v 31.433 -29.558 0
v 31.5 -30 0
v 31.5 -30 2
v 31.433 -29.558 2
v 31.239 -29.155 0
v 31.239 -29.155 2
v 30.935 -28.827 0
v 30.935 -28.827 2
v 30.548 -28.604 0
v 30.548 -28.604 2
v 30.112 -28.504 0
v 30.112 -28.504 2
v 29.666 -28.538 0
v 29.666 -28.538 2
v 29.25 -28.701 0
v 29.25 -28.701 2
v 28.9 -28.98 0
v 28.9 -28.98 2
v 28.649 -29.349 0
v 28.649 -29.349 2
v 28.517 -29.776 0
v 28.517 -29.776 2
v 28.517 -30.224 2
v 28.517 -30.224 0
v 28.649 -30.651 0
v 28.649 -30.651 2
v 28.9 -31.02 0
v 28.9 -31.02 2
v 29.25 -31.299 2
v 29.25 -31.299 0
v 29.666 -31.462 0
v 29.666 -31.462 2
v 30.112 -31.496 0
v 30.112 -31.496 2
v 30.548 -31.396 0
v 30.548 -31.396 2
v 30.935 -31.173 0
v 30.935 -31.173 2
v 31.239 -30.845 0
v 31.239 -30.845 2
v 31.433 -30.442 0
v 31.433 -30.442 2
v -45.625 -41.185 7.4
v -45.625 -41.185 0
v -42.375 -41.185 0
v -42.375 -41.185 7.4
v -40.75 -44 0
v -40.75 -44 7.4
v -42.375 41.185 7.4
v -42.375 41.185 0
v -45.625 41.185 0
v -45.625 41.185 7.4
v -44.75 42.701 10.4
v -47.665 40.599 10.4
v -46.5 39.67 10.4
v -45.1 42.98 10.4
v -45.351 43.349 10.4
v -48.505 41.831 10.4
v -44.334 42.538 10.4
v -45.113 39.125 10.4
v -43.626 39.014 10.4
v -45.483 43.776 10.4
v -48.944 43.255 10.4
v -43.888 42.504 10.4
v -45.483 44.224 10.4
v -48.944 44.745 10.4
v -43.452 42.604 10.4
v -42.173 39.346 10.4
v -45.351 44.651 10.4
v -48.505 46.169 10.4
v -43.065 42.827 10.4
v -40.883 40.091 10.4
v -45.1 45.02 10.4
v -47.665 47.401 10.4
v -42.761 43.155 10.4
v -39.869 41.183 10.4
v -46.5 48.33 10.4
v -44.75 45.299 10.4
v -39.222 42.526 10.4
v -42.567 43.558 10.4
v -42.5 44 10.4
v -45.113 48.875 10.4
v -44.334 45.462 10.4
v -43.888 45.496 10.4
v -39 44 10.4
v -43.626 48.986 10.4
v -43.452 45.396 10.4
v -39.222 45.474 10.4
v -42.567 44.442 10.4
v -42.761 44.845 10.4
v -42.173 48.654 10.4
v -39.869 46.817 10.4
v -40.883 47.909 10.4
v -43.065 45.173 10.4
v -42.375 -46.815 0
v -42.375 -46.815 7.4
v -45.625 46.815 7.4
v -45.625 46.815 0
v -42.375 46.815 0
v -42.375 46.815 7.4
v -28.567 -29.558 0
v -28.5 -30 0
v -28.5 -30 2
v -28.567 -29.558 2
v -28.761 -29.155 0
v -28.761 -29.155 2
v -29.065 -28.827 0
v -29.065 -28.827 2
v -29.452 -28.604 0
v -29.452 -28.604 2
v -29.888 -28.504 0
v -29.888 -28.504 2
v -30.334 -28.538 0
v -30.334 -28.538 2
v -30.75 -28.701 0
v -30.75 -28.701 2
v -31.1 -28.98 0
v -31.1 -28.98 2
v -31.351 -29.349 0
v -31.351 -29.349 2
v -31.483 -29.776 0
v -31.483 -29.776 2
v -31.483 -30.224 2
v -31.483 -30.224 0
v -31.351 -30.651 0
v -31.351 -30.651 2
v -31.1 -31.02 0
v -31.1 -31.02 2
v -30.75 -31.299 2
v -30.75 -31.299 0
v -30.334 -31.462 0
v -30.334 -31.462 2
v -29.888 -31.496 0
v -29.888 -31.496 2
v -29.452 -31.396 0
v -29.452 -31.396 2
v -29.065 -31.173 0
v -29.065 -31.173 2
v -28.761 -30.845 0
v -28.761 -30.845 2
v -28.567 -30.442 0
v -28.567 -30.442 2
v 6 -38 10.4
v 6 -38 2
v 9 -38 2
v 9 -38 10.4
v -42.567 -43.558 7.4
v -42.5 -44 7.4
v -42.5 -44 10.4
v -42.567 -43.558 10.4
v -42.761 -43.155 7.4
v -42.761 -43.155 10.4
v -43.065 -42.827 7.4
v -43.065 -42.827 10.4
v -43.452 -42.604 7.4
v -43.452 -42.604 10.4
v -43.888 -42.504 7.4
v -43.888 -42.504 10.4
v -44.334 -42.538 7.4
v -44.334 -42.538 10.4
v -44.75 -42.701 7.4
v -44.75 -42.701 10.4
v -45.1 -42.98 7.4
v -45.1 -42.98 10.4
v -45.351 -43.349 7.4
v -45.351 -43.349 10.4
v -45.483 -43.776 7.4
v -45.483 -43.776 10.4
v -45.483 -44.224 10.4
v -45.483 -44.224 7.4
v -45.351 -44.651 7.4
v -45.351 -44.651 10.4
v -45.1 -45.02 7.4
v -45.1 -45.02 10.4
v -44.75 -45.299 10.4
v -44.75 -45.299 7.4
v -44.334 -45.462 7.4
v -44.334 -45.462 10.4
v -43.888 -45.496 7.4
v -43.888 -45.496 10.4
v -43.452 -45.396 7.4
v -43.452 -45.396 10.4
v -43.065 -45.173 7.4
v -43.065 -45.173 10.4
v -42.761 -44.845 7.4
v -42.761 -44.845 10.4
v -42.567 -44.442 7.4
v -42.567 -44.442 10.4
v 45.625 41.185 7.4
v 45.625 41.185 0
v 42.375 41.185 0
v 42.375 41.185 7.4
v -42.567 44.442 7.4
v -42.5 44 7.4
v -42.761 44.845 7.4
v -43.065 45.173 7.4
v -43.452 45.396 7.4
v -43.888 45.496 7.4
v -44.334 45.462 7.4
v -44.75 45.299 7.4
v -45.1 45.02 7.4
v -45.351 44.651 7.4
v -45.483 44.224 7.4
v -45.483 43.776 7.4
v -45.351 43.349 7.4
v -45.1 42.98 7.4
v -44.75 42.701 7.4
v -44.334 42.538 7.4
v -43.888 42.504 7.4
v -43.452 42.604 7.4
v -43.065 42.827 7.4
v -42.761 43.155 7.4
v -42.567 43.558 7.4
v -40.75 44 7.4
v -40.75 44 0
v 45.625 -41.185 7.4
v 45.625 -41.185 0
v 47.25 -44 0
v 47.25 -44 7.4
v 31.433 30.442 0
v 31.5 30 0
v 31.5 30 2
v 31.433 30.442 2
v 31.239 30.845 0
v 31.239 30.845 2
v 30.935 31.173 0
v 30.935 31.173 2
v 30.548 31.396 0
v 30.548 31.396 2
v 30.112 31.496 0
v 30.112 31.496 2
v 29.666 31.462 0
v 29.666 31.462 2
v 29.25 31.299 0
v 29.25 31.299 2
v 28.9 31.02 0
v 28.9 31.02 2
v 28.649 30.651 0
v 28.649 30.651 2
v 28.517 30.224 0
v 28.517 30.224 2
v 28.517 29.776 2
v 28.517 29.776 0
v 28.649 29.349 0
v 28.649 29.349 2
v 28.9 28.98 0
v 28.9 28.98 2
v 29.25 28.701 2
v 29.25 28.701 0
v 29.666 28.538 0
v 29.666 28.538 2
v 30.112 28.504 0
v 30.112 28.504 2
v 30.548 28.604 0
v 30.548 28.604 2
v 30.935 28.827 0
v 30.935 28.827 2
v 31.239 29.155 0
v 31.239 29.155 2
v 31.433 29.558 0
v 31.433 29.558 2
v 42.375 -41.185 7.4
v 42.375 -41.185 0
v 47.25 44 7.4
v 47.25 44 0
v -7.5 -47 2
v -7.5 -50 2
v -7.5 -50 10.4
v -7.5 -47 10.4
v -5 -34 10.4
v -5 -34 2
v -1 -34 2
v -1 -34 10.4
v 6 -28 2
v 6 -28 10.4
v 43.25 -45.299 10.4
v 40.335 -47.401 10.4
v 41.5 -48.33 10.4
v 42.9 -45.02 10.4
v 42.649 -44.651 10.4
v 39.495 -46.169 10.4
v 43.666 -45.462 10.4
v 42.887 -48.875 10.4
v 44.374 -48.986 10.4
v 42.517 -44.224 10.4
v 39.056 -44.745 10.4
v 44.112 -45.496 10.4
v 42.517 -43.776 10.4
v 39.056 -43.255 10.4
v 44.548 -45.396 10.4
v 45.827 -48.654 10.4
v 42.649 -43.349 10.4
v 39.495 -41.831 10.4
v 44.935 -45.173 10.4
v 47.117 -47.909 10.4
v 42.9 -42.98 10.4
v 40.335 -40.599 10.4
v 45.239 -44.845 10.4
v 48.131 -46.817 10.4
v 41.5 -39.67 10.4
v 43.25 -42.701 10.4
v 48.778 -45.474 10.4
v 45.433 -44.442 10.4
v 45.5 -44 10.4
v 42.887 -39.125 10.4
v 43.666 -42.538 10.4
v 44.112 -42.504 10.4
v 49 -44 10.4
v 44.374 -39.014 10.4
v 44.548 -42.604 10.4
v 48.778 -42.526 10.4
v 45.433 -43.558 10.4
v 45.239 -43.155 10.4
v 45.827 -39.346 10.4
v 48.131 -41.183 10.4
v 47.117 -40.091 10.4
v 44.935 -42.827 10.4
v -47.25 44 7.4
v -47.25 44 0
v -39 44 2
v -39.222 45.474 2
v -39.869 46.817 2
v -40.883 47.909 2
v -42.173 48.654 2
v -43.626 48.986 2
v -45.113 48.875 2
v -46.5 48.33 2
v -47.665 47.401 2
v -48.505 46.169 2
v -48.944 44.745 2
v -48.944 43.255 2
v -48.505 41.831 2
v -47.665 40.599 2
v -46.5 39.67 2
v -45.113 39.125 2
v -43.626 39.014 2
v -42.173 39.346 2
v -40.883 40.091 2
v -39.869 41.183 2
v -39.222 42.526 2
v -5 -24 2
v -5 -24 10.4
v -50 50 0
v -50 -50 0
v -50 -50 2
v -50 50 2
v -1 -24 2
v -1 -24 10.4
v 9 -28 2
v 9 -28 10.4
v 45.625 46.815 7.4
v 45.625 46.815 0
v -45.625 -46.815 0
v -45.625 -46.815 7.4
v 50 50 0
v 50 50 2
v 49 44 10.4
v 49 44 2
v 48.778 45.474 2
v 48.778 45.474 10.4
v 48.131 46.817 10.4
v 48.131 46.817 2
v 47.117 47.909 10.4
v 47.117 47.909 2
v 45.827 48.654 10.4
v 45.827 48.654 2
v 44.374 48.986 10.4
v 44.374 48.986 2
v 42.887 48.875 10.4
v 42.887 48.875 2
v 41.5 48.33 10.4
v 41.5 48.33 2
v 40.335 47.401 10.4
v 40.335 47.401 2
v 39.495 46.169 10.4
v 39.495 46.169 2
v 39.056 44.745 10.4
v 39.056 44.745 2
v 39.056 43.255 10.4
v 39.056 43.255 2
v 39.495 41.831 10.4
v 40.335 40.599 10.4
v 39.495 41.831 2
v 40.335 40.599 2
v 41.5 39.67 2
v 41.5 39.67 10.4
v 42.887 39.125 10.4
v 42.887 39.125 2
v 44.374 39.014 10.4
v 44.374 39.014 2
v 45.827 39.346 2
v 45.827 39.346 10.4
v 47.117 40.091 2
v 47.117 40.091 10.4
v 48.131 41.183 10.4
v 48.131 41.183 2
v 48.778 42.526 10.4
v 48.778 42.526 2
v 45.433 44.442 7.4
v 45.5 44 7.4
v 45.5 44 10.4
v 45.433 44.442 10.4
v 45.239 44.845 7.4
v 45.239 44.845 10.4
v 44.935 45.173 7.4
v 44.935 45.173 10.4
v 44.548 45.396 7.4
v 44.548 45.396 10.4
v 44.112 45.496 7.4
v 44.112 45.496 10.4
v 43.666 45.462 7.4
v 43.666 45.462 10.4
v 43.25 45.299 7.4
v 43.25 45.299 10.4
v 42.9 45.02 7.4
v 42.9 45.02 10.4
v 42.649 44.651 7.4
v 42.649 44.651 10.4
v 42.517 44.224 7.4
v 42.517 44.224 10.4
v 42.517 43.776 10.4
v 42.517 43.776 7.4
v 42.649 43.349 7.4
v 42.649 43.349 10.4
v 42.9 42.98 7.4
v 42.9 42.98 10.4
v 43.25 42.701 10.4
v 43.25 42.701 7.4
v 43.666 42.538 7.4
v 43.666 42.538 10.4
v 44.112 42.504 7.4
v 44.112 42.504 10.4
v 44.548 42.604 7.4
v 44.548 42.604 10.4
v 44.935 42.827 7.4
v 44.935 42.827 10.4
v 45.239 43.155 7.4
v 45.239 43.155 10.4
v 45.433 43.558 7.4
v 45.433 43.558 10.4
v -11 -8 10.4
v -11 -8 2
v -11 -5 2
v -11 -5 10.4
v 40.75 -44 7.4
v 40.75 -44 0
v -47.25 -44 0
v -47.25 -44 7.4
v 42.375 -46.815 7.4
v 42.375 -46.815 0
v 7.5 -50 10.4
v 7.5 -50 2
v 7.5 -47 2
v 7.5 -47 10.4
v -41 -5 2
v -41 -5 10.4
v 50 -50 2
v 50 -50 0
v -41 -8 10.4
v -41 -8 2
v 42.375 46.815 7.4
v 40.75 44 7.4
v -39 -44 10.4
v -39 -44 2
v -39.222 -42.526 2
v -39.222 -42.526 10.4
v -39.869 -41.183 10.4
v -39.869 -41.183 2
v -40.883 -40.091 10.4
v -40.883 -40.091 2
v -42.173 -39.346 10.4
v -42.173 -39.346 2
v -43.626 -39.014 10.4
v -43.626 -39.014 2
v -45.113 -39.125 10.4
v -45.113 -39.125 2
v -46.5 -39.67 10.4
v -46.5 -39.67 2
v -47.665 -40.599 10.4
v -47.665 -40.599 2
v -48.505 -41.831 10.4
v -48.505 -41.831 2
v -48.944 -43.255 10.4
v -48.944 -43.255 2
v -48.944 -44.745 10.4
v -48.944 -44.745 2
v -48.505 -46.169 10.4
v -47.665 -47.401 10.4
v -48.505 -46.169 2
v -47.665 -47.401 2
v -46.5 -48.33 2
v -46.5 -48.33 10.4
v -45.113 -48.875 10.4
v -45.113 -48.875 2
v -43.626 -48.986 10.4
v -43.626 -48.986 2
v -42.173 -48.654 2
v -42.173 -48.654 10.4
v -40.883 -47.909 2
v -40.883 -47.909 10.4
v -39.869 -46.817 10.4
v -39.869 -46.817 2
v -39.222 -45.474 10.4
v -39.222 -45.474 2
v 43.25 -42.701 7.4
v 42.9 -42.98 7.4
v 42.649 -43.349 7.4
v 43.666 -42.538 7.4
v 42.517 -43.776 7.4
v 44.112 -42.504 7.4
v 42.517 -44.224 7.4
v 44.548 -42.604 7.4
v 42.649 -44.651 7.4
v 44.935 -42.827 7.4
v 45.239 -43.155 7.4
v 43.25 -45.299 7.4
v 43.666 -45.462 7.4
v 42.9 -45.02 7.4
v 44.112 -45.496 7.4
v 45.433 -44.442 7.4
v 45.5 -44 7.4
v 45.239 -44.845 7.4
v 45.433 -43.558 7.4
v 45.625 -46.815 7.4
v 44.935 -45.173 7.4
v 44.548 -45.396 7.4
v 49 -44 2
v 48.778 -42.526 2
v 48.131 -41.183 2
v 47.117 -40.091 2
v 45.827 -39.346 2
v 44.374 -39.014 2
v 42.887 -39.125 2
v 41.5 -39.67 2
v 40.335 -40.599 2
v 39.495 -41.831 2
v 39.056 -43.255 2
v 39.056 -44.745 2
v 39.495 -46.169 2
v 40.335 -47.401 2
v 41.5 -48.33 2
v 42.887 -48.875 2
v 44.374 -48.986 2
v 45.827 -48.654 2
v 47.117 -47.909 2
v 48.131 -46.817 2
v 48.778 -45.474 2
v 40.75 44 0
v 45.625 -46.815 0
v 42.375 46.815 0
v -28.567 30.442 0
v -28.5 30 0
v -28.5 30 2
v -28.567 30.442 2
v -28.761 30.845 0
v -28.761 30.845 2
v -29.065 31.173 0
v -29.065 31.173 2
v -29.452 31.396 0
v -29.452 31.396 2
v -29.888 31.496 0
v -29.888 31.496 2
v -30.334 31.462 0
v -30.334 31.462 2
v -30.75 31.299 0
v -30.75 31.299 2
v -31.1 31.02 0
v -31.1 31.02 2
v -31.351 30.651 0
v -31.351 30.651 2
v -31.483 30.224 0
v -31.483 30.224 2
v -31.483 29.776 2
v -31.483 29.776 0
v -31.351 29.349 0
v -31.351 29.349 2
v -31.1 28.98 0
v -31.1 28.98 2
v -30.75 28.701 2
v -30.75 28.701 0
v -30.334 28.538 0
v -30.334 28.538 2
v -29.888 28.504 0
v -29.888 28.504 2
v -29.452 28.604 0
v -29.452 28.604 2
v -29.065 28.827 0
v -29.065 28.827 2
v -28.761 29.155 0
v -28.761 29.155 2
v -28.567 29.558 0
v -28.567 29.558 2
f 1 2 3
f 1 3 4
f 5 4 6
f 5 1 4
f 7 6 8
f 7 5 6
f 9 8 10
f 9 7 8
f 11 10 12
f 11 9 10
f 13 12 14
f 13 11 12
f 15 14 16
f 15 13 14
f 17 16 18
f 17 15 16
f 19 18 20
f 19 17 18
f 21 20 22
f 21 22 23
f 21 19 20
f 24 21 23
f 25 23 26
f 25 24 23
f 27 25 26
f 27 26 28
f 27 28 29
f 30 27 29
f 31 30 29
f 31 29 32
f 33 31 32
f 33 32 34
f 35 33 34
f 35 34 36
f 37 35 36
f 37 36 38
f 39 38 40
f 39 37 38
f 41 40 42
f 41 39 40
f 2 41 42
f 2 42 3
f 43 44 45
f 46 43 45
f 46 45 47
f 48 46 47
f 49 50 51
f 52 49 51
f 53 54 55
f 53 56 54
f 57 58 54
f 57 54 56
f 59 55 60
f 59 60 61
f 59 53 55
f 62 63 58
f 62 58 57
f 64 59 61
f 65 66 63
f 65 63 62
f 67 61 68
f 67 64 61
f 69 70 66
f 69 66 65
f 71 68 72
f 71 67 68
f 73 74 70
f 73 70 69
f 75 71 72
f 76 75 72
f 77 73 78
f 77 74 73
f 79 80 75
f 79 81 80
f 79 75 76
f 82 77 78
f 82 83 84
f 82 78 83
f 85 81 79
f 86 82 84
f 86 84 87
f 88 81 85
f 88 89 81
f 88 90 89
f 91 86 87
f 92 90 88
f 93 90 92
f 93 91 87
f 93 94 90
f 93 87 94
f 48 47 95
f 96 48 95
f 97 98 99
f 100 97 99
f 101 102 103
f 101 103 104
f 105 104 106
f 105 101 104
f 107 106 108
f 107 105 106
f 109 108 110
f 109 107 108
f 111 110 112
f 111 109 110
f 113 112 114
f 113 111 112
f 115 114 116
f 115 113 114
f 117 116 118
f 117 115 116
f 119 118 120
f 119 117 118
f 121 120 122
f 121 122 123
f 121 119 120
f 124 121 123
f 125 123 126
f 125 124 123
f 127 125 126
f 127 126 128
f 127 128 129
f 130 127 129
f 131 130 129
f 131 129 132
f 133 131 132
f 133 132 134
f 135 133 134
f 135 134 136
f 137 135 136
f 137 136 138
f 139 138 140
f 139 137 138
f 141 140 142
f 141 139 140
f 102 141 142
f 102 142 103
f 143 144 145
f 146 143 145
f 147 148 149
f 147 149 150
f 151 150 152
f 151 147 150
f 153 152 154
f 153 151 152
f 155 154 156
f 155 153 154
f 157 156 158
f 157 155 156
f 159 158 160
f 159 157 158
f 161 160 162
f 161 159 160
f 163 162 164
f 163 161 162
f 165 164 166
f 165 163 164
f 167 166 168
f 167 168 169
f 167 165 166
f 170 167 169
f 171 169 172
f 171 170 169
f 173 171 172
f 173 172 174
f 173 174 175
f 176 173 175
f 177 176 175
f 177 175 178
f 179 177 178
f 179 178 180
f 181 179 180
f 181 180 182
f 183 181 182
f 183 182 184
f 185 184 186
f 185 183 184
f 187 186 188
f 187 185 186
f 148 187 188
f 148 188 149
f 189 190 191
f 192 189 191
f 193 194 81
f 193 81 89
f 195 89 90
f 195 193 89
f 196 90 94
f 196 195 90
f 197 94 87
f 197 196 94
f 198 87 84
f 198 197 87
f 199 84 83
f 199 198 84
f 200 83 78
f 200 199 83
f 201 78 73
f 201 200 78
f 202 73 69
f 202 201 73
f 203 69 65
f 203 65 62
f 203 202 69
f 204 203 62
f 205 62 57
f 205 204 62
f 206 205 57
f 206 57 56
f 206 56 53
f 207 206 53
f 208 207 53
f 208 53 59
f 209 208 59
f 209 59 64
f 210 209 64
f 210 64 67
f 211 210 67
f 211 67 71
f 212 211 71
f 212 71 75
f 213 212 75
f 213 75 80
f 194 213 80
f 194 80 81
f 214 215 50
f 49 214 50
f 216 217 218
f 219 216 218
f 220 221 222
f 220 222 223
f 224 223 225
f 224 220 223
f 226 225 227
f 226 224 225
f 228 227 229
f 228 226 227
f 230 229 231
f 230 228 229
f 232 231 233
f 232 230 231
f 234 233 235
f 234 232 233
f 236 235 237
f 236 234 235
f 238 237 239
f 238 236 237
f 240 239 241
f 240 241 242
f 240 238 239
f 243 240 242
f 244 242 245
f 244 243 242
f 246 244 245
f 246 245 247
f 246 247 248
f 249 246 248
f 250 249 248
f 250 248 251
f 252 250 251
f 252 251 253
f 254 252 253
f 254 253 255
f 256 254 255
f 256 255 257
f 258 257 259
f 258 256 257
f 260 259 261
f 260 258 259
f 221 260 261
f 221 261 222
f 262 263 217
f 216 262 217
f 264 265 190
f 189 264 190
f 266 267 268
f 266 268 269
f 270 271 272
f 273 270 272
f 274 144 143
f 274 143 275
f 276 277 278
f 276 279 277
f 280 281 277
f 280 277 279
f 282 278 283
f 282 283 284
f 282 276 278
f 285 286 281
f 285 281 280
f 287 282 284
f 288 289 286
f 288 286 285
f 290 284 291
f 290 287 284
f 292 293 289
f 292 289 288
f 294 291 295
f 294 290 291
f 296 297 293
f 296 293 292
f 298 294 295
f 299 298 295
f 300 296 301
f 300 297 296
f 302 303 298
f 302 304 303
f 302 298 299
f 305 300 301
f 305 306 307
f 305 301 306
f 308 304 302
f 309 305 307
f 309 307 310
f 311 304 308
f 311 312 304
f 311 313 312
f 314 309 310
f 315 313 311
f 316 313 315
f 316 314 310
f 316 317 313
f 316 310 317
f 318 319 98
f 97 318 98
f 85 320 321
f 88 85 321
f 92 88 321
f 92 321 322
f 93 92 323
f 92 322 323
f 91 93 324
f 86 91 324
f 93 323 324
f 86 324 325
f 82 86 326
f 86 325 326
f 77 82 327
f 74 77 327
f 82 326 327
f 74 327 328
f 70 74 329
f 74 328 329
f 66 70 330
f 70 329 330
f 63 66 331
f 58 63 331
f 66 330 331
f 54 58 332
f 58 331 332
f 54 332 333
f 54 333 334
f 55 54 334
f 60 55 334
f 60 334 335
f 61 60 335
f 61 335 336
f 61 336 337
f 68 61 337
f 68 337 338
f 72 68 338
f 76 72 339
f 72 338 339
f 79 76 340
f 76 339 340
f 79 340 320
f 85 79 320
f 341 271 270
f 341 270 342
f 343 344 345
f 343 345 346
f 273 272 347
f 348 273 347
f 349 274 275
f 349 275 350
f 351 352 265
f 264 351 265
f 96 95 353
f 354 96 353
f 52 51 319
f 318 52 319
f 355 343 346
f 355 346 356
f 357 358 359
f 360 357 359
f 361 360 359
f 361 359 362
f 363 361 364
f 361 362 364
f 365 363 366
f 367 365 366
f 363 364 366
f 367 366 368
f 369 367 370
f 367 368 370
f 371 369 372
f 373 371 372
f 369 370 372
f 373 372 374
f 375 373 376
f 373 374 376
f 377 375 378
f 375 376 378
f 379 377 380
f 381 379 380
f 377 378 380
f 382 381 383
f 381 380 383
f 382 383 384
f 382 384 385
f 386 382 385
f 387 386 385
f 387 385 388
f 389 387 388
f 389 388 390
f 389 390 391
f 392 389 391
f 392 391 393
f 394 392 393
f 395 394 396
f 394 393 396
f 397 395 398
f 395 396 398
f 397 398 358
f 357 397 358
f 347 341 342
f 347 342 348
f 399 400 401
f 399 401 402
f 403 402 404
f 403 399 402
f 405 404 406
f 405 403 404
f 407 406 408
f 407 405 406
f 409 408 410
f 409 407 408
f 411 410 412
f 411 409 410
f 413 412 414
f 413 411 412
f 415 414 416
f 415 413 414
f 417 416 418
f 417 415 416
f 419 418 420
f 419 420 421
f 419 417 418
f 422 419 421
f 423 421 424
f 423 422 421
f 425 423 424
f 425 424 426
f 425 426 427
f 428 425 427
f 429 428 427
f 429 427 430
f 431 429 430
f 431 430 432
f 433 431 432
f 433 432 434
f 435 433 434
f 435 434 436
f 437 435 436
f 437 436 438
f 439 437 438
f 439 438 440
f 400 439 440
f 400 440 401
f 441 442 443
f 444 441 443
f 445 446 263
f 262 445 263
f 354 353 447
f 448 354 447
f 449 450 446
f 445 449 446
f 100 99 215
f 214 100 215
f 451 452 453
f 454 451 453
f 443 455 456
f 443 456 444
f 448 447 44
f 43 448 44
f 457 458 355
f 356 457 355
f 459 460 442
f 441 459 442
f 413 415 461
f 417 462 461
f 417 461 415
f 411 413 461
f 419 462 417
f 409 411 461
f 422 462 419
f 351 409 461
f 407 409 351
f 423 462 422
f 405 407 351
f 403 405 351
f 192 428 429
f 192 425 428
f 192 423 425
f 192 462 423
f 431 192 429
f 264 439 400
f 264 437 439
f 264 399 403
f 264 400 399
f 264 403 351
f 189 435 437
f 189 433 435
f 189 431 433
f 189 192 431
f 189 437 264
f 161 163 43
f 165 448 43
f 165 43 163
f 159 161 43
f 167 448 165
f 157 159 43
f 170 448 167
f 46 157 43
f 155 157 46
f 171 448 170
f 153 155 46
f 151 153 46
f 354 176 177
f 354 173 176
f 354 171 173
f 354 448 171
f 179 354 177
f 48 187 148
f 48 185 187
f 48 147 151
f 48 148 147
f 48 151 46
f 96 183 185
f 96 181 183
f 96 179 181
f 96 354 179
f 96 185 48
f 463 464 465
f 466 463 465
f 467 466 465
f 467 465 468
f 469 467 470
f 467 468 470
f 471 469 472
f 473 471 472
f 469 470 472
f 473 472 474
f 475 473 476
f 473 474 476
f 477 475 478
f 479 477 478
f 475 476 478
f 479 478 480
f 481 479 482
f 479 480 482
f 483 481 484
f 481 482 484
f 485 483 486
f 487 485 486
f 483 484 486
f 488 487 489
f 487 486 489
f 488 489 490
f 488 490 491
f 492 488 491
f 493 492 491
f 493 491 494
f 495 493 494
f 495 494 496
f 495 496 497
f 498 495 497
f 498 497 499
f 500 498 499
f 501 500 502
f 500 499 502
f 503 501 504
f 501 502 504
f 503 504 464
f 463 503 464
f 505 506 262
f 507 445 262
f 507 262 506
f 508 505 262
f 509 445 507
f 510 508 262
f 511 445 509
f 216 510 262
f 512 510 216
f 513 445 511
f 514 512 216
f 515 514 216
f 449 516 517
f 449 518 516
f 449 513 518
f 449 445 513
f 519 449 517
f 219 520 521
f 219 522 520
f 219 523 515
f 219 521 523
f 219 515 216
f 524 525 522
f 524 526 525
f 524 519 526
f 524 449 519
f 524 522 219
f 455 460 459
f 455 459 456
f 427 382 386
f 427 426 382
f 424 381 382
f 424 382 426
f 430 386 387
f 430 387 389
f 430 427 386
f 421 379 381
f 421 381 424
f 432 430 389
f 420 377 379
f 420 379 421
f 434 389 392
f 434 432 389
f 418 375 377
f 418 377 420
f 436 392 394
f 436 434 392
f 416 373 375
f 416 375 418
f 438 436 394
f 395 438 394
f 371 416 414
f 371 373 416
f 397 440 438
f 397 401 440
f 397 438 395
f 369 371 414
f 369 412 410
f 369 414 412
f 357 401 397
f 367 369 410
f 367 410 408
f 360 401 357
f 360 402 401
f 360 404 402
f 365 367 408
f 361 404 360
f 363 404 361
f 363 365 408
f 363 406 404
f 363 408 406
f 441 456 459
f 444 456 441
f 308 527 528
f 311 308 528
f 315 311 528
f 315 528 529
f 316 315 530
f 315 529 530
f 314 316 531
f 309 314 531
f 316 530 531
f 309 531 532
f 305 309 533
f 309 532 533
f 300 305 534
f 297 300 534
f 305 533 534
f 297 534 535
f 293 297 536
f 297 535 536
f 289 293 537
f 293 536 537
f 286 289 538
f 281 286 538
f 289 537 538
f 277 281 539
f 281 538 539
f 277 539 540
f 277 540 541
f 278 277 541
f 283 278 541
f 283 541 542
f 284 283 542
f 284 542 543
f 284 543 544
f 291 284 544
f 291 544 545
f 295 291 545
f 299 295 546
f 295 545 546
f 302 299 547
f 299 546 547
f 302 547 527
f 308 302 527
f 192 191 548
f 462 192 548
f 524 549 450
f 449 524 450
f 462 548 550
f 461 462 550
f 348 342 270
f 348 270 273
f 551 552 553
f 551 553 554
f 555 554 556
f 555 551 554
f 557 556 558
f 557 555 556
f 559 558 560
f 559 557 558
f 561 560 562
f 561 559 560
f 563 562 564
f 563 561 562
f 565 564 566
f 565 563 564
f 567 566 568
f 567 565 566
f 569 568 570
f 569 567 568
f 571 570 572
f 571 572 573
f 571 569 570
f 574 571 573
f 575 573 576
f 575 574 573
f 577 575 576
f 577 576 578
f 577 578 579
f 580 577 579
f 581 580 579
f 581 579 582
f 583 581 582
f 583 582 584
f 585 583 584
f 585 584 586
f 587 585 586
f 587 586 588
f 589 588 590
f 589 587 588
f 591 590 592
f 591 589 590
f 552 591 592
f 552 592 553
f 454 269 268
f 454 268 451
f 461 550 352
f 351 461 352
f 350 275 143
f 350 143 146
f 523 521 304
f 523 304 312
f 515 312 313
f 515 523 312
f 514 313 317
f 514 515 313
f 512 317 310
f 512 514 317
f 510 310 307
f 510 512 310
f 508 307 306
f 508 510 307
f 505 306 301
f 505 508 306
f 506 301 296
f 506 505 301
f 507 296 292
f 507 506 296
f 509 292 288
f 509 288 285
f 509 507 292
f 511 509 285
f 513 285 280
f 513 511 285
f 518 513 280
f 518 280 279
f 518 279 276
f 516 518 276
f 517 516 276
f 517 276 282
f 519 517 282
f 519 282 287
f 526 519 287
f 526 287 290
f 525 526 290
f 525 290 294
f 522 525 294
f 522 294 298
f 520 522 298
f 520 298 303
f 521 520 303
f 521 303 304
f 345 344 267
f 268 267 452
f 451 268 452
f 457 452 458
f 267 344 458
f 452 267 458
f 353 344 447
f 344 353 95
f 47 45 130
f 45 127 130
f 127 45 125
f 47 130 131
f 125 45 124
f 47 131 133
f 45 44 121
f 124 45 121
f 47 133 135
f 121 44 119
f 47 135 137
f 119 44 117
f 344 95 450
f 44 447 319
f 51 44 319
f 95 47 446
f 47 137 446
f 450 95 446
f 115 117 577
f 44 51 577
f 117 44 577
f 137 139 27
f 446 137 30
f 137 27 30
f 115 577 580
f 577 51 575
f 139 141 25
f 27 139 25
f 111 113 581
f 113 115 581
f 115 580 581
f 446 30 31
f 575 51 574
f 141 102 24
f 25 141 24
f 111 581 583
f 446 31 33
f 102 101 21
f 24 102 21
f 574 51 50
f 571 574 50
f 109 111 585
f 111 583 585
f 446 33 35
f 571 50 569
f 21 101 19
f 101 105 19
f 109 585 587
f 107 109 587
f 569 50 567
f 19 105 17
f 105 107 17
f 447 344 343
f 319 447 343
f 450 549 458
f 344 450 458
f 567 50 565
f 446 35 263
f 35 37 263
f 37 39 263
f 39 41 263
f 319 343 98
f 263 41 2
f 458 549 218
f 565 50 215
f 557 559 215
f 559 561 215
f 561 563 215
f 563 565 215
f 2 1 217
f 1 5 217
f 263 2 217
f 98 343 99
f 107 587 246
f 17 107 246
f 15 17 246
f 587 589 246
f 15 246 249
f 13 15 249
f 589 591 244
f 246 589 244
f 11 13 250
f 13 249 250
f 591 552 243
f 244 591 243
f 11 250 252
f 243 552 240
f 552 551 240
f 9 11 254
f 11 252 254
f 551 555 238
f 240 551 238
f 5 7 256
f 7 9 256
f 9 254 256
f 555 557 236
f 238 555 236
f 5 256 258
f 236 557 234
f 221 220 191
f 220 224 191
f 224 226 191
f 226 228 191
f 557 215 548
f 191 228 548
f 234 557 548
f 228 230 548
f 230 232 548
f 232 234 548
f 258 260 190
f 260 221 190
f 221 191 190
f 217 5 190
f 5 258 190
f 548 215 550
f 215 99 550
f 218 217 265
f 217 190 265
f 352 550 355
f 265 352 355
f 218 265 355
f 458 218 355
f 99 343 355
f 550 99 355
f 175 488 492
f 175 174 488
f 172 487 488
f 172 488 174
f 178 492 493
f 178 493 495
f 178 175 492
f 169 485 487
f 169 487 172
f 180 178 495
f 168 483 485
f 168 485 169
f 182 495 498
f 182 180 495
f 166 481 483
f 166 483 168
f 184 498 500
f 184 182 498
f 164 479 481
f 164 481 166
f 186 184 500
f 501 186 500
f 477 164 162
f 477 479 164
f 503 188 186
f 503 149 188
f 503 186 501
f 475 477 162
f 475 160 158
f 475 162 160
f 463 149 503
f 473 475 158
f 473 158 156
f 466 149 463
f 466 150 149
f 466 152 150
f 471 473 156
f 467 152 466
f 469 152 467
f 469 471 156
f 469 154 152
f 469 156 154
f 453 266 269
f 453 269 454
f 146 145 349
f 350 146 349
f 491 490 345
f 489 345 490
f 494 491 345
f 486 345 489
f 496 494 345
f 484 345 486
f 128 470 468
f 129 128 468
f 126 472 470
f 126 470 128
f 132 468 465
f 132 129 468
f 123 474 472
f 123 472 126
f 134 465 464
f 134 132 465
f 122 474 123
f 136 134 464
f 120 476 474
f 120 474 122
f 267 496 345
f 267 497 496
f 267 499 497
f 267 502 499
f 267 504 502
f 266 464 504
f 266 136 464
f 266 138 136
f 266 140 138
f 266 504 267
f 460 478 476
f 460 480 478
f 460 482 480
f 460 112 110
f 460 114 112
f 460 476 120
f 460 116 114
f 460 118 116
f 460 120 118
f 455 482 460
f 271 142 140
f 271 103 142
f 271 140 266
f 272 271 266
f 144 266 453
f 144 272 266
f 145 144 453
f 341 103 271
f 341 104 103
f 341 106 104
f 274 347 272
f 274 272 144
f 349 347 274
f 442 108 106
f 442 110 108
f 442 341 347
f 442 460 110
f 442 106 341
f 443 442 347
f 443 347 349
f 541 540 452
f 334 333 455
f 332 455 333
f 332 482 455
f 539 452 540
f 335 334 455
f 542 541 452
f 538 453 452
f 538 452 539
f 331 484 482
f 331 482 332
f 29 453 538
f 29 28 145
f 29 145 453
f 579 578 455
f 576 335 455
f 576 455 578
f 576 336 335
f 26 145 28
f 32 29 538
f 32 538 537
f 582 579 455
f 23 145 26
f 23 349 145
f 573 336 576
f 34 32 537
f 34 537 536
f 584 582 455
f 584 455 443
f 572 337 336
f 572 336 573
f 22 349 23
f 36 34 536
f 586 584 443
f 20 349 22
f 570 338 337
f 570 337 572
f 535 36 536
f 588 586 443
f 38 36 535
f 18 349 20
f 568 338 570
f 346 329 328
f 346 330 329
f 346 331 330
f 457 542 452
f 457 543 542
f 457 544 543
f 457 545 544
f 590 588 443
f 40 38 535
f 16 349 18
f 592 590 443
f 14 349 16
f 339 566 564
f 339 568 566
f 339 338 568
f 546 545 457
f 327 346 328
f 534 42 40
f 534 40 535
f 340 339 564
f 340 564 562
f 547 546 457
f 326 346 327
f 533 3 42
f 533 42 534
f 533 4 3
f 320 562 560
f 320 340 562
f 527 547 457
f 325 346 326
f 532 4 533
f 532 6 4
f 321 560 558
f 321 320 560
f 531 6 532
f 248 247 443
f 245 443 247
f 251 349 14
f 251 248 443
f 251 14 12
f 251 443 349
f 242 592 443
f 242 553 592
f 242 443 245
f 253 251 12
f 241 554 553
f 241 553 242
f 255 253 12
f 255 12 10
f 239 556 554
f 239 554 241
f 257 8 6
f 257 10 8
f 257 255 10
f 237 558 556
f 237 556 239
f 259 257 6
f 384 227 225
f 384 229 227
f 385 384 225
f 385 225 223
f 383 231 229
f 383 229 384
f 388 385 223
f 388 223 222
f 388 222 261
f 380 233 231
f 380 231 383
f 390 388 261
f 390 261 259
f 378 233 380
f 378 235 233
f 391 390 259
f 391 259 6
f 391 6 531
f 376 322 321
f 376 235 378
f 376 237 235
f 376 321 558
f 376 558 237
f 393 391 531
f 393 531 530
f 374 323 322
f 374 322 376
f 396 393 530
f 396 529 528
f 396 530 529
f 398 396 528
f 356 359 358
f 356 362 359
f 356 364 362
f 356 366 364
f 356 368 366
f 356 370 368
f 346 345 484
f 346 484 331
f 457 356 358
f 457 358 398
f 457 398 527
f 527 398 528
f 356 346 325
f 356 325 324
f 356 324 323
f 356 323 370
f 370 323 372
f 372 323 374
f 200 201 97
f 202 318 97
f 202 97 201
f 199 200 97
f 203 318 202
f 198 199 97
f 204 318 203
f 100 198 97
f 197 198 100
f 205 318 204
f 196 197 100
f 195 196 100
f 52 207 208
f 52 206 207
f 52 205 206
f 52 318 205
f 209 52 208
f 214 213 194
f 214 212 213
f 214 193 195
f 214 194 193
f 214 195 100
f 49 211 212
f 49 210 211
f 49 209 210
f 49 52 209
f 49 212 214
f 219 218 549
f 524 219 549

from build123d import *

# Parameters (mm, degrees)
SKETCH_W      = 100
SKETCH_H      = 100
SKETCH_R      = 1.5
PAD_DEPTH     = 2
SKETCH005_R   = 5
SKETCH005_R_2 = 1.5
PAD001_DEPTH  = 8.4
SKETCH007_W   = 4
SKETCH007_H   = 10
SKETCH007_W_2 = 3
SKETCH007_W_3 = 15
SKETCH007_H_2 = 3
SKETCH007_W_4 = 30
PAD002_DEPTH  = 8.4
POCKET_DEPTH  = 7.4


with BuildPart() as part:
    # Sketch → Pad (new body)
    with BuildSketch(Plane.XY):
        Rectangle(SKETCH_W, SKETCH_H)
        with Locations((-30, -30)):
            Circle(SKETCH_R, mode=Mode.SUBTRACT)
        with Locations((30, -30)):
            Circle(SKETCH_R, mode=Mode.SUBTRACT)
        with Locations((30, 30)):
            Circle(SKETCH_R, mode=Mode.SUBTRACT)
        with Locations((-30, 30)):
            Circle(SKETCH_R, mode=Mode.SUBTRACT)
        with Locations((-44, 44)):
            Circle(SKETCH_R, mode=Mode.SUBTRACT)
        with Locations((44, 44)):
            Circle(SKETCH_R, mode=Mode.SUBTRACT)
        with Locations((44, -44)):
            Circle(SKETCH_R, mode=Mode.SUBTRACT)
        with Locations((-44, -44)):
            Circle(SKETCH_R, mode=Mode.SUBTRACT)
    extrude(amount=PAD_DEPTH)

    # Sketch005 → Pad001 (join)
    with BuildSketch(Plane.XY.offset(2)):
        with Locations((-44, -44)):
            Circle(SKETCH005_R)
        with Locations((-44, -44)):
            Circle(SKETCH005_R_2, mode=Mode.SUBTRACT)
        with Locations((-44, 44)):
            Circle(SKETCH005_R)
        with Locations((-44, 44)):
            Circle(SKETCH005_R_2, mode=Mode.SUBTRACT)
        with Locations((44, 44)):
            Circle(SKETCH005_R)
        with Locations((44, 44)):
            Circle(SKETCH005_R_2, mode=Mode.SUBTRACT)
        with Locations((44, -44)):
            Circle(SKETCH005_R)
        with Locations((44, -44)):
            Circle(SKETCH005_R_2, mode=Mode.SUBTRACT)
    extrude(amount=PAD001_DEPTH)

    # Sketch007 → Pad002 (join)
    with BuildSketch(Plane.XY.offset(2)):
        with Locations((-3, -29)):
            Rectangle(SKETCH007_W, SKETCH007_H)
        with Locations((7.5, -33)):
            Rectangle(SKETCH007_W_2, SKETCH007_H)
        with Locations((0, -48.5)):
            Rectangle(SKETCH007_W_3, SKETCH007_H_2)
        with Locations((-26, -6.5)):
            Rectangle(SKETCH007_W_4, SKETCH007_H_2)
    extrude(amount=PAD002_DEPTH)

    # Sketch006 → Pocket (cut)
    with BuildSketch(Plane(origin=(0, 0, 0), x_dir=(1, 0, 0), z_dir=(0, 0, -1))):
        Polygon((-40.75, 44), (-42.375, 46.814583), (-45.625, 46.814583), (-47.25, 44), (-45.625, 41.185417), (-42.375, 41.185417), align=None)
        Polygon((45.625, 46.814583), (42.375, 46.814583), (40.75, 44), (42.375, 41.185417), (45.625, 41.185417), (47.25, 44), align=None)
        Polygon((45.625, -41.185417), (42.375, -41.185417), (40.75, -44), (42.375, -46.814583), (45.625, -46.814583), (47.25, -44), align=None)
        Polygon((-40.75, -44), (-42.375, -41.185417), (-45.625, -41.185417), (-47.25, -44), (-45.625, -46.814583), (-42.375, -46.814583), align=None)
    extrude(amount=-POCKET_DEPTH, mode=Mode.SUBTRACT)


solid = part.part
